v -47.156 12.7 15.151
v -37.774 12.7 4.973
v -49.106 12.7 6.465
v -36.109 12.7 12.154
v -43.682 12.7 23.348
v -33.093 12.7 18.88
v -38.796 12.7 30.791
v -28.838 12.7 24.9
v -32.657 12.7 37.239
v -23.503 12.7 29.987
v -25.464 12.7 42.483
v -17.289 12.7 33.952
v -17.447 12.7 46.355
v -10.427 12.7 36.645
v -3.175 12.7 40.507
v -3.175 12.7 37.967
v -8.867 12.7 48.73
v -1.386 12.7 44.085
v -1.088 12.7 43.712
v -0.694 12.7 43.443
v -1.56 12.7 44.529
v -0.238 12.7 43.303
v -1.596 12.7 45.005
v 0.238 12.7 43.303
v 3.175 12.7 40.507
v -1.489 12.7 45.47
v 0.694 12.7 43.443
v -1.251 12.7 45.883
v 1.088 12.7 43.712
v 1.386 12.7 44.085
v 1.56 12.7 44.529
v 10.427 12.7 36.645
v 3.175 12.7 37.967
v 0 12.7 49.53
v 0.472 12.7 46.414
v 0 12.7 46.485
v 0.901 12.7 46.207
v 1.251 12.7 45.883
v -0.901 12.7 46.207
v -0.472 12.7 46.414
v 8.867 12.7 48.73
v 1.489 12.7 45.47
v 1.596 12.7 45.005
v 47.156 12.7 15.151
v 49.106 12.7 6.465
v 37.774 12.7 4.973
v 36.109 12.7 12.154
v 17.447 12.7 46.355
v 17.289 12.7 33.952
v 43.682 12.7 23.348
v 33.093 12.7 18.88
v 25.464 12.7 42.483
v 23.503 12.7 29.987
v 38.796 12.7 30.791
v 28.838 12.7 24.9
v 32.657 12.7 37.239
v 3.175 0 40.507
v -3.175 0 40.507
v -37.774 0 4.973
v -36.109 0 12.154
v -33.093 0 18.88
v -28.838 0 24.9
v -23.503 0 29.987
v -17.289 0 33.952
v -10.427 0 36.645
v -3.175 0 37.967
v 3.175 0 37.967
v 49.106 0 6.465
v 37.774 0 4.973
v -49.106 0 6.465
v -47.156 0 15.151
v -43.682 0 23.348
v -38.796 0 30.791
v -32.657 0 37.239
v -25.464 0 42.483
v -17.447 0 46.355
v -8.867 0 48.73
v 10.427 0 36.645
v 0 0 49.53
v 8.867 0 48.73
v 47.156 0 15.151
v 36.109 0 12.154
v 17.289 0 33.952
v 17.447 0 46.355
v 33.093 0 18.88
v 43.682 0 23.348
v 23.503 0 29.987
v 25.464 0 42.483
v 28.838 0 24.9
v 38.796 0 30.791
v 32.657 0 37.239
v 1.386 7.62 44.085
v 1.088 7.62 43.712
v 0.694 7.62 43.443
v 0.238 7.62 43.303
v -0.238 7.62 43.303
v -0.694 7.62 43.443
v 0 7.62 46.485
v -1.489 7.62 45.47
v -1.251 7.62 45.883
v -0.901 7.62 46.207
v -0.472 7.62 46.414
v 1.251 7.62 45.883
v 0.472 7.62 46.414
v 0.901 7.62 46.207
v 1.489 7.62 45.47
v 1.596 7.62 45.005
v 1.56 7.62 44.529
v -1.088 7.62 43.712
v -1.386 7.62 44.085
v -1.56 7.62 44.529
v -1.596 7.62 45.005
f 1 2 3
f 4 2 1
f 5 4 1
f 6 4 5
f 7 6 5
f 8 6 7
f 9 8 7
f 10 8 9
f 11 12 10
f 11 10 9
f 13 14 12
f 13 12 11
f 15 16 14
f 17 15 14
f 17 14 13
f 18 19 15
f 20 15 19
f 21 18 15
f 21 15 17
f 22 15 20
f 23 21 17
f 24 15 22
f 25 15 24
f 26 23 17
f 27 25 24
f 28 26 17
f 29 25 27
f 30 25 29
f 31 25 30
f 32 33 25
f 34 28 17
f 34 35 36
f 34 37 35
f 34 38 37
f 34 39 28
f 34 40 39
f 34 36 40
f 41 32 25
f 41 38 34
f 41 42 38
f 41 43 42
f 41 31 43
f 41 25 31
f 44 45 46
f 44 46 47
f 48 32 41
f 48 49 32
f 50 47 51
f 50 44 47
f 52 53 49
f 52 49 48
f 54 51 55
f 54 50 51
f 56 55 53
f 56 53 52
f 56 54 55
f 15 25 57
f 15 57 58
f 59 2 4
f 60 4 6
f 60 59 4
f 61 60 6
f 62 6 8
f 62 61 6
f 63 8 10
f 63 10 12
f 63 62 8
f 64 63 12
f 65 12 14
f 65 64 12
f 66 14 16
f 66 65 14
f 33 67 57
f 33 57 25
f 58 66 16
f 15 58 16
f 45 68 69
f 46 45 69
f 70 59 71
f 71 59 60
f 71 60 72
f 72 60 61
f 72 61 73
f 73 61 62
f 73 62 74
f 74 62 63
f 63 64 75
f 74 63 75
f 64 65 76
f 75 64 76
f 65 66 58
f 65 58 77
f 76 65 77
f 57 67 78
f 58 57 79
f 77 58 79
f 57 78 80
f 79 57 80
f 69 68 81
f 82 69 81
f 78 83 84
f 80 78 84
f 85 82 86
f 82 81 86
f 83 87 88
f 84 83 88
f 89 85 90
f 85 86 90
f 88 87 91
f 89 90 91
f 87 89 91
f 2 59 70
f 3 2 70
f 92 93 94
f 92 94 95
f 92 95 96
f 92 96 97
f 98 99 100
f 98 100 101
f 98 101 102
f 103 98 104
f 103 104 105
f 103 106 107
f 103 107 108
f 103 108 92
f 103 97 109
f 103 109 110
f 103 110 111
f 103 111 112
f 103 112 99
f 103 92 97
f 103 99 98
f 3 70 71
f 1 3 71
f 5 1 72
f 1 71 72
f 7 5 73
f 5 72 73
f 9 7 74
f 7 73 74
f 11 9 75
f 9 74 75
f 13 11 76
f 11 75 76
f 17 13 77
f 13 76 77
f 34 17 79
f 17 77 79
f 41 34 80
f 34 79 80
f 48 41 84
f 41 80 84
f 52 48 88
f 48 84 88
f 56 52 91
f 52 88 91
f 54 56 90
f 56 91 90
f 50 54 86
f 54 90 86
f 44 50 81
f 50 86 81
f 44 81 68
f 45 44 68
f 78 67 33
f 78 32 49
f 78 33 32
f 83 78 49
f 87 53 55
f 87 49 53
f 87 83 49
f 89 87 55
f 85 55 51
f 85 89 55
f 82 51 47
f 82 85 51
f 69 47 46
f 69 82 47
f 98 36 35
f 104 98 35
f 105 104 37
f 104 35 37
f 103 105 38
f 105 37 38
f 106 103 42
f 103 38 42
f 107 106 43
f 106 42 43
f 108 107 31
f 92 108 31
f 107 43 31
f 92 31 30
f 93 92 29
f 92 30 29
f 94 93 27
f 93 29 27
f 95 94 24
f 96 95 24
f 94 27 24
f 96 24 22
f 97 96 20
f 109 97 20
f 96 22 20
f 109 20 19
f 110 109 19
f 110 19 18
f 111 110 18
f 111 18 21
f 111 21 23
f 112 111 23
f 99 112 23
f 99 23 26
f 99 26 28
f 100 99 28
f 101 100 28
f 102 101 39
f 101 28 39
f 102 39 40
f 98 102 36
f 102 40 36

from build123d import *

# Parameters (mm, degrees)
SKETCH1_R               = 49.53
SKETCH1_R_2             = 38.1
BOSS_EXTRUDE1_DEPTH     = 12.7
CUT_EXTRUDE1_DEPTH      = 72.188003203
CUT_EXTRUDE1_DEPTH_BACK = 72.188003203
SKETCH8_W               = 6.35
SKETCH8_H               = 75.934955718
CUT_EXTRUDE3_DEPTH      = 71.893836562
SKETCH9_W               = 6.35
SKETCH9_H               = 12.7
CUT_EXTRUDE4_DEPTH      = 2.54
SKETCH10_R              = 1.6
CUT_EXTRUDE5_DEPTH      = 5.08


with BuildPart() as part:
    # Sketch1 → Boss-Extrude1 (new body)
    # profile 1 of 2: a face of its own
    with BuildSketch(Plane(origin=(0, 0, 0), x_dir=(1, 0, 0), z_dir=(0, 1, 0))):
        with Locations(Location((0, 0, 0), (0, 0, 270))):
            Circle(SKETCH1_R)
        Circle(SKETCH1_R_2, mode=Mode.SUBTRACT)
    # profile 2 of 2: a face of its own
    with BuildSketch(Plane(origin=(0, 0, 0), x_dir=(1, 0, 0), z_dir=(0, 1, 0))):
        with BuildLine():
            Line((-3.175, 37.967477859), (-3.175, -37.967477859))
            ThreePointArc((-3.175, -37.967477859), (0, -38.1), (3.175, -37.967477859))
            Line((3.175, -37.967477859), (3.175, 37.967477859))
            ThreePointArc((3.175, 37.967477859), (0, 38.1), (-3.175, 37.967477859))
        make_face()
    extrude(amount=BOSS_EXTRUDE1_DEPTH)

    # Sketch7 → Cut-Extrude1 (cut, two sides: drawn at the far end of the back side and taken through both)
    with BuildSketch(Plane.XZ.offset(-CUT_EXTRUDE1_DEPTH_BACK)):
        with BuildLine():
            Line((-49.106263984, -6.464962301), (-37.774049218, -4.973047924))
            ThreePointArc((-37.774049218, -4.973047924), (-38.1, 0), (-37.774049218, 4.973047924))
            Line((-37.774049218, 4.973047924), (-49.106263984, 6.464962301))
            ThreePointArc((-49.106263984, 6.464962301), (-49.53, 0), (-49.106263984, -6.464962301))
        make_face()
        with BuildLine():
            Line((49.106263984, 6.464962301), (37.774049218, 4.973047924))
            ThreePointArc((37.774049218, 4.973047924), (38.1, 0), (37.774049218, -4.973047924))
            Line((37.774049218, -4.973047924), (49.106263984, -6.464962301))
            ThreePointArc((49.106263984, -6.464962301), (49.53, 0), (49.106263984, 6.464962301))
        make_face()
    extrude(amount=CUT_EXTRUDE1_DEPTH + CUT_EXTRUDE1_DEPTH_BACK, mode=Mode.SUBTRACT)

    # Sketch8 → Cut-Extrude3 (cut, through all)
    with BuildSketch(Plane(origin=(0, 12.7, 0), x_dir=(1, 0, 0), z_dir=(0, 1, 0))):
        Rectangle(SKETCH8_W, SKETCH8_H)
    extrude(amount=-CUT_EXTRUDE3_DEPTH, mode=Mode.SUBTRACT)


with BuildPart() as body_2:
    # of the pieces the cut leaves, the one that is kept (cut_extrude3_keep)
    add(part.part.solids().sort_by_distance((-49.106263984, 0, 6.464962301))[0])

    # Sketch9 → Cut-Extrude4 (cut)
    with BuildSketch(Plane(origin=(0, 0, 37.967477859), x_dir=(-1, 0, 0), z_dir=(0, 0, -1))):
        with Locations((0, 6.35)):
            Rectangle(SKETCH9_W, SKETCH9_H)
    extrude(amount=-CUT_EXTRUDE4_DEPTH, mode=Mode.SUBTRACT)

    # Sketch10 → Cut-Extrude5 (cut)
    with BuildSketch(Plane(origin=(0, 12.7, 0), x_dir=(1, 0, 0), z_dir=(0, 1, 0))):
        with Locations(Location((0, -44.885010743, 0), (0, 0, 270))):
            Circle(SKETCH10_R)
    extrude(amount=-CUT_EXTRUDE5_DEPTH, mode=Mode.SUBTRACT)


solid = body_2.part
